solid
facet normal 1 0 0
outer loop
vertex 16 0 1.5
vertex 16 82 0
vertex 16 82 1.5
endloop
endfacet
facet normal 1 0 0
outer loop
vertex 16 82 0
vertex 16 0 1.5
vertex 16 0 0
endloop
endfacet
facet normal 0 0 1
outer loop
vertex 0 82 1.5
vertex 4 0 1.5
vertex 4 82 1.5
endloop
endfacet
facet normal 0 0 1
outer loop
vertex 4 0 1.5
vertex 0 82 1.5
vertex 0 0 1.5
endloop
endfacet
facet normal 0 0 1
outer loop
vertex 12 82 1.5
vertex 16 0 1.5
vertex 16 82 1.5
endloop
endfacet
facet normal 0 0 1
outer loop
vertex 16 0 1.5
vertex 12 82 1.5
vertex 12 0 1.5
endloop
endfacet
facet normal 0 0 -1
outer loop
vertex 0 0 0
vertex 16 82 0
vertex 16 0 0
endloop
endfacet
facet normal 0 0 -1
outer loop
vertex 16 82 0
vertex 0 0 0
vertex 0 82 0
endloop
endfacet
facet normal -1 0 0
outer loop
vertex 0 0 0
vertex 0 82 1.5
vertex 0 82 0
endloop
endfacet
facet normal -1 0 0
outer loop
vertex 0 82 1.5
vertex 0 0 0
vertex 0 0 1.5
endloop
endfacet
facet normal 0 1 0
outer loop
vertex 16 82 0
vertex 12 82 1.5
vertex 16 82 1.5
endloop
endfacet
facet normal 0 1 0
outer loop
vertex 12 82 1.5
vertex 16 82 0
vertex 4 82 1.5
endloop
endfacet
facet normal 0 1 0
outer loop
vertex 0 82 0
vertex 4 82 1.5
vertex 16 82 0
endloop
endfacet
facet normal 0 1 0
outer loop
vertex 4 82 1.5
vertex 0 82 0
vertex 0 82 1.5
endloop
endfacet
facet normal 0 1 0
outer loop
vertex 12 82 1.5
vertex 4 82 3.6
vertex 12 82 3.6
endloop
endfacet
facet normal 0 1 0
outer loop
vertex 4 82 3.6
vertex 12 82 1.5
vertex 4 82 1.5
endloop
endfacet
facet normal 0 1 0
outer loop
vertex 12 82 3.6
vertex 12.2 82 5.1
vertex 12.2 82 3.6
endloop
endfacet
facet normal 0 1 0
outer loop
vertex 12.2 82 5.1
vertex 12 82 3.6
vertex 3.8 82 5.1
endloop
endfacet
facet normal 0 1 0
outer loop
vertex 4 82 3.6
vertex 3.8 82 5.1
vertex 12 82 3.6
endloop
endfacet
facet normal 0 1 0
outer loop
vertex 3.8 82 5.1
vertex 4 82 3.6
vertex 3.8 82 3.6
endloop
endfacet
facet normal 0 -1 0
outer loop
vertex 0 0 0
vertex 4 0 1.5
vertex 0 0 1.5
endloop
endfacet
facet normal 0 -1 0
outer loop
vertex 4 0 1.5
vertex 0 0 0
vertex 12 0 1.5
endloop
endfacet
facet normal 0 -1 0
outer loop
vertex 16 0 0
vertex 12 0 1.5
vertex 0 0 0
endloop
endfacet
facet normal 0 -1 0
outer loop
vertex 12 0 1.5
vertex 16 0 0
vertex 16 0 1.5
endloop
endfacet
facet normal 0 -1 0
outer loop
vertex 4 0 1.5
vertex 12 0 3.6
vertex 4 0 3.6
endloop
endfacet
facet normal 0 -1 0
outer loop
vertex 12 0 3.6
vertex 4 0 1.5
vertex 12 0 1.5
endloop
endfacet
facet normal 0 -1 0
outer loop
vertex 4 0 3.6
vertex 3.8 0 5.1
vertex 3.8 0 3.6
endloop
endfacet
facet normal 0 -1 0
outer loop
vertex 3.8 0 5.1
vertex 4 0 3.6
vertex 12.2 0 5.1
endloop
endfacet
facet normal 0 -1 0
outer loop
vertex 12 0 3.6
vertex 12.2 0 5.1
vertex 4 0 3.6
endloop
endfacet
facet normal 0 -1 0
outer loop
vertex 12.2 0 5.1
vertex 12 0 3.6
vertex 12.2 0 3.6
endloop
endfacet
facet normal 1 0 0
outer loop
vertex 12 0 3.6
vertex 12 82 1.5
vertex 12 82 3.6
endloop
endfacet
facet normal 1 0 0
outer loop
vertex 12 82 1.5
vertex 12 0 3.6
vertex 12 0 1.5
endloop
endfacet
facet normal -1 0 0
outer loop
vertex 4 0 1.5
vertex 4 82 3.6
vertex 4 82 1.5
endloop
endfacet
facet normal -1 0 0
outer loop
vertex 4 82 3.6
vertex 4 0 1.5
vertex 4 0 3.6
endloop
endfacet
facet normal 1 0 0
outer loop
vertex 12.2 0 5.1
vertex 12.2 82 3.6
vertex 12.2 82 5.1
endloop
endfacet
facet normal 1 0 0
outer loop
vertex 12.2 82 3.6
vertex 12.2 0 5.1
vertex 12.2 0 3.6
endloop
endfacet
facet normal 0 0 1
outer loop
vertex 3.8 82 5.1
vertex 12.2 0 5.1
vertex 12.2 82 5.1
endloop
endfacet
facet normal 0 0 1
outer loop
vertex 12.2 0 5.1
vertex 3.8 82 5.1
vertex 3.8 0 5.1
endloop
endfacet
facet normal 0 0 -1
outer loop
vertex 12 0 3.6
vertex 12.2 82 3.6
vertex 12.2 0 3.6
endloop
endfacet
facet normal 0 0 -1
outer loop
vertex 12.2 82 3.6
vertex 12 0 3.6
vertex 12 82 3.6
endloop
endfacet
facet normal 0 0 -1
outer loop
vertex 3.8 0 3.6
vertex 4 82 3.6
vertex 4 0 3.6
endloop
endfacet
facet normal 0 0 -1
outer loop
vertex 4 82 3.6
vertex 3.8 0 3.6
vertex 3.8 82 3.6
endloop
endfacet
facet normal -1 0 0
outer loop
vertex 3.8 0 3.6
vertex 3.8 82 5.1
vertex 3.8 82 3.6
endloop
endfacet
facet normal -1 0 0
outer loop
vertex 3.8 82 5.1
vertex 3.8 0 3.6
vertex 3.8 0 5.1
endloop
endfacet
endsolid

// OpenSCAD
// [FL_INDEX: keywords="openscad, 3d_parametric, covers_to_aluminum_profile_30x30, csg_solid" | COT="Parametric OpenSCAD design from 3DCodeverse"]
// Title: covers to aluminum profile 30x30

lun=82;
cube([16,lun,1.5]);

translate([4,0,1.5]) cube([8,lun,2.4]);
translate([3.8,0,3.6]) cube([8.4,lun,1.5]);
